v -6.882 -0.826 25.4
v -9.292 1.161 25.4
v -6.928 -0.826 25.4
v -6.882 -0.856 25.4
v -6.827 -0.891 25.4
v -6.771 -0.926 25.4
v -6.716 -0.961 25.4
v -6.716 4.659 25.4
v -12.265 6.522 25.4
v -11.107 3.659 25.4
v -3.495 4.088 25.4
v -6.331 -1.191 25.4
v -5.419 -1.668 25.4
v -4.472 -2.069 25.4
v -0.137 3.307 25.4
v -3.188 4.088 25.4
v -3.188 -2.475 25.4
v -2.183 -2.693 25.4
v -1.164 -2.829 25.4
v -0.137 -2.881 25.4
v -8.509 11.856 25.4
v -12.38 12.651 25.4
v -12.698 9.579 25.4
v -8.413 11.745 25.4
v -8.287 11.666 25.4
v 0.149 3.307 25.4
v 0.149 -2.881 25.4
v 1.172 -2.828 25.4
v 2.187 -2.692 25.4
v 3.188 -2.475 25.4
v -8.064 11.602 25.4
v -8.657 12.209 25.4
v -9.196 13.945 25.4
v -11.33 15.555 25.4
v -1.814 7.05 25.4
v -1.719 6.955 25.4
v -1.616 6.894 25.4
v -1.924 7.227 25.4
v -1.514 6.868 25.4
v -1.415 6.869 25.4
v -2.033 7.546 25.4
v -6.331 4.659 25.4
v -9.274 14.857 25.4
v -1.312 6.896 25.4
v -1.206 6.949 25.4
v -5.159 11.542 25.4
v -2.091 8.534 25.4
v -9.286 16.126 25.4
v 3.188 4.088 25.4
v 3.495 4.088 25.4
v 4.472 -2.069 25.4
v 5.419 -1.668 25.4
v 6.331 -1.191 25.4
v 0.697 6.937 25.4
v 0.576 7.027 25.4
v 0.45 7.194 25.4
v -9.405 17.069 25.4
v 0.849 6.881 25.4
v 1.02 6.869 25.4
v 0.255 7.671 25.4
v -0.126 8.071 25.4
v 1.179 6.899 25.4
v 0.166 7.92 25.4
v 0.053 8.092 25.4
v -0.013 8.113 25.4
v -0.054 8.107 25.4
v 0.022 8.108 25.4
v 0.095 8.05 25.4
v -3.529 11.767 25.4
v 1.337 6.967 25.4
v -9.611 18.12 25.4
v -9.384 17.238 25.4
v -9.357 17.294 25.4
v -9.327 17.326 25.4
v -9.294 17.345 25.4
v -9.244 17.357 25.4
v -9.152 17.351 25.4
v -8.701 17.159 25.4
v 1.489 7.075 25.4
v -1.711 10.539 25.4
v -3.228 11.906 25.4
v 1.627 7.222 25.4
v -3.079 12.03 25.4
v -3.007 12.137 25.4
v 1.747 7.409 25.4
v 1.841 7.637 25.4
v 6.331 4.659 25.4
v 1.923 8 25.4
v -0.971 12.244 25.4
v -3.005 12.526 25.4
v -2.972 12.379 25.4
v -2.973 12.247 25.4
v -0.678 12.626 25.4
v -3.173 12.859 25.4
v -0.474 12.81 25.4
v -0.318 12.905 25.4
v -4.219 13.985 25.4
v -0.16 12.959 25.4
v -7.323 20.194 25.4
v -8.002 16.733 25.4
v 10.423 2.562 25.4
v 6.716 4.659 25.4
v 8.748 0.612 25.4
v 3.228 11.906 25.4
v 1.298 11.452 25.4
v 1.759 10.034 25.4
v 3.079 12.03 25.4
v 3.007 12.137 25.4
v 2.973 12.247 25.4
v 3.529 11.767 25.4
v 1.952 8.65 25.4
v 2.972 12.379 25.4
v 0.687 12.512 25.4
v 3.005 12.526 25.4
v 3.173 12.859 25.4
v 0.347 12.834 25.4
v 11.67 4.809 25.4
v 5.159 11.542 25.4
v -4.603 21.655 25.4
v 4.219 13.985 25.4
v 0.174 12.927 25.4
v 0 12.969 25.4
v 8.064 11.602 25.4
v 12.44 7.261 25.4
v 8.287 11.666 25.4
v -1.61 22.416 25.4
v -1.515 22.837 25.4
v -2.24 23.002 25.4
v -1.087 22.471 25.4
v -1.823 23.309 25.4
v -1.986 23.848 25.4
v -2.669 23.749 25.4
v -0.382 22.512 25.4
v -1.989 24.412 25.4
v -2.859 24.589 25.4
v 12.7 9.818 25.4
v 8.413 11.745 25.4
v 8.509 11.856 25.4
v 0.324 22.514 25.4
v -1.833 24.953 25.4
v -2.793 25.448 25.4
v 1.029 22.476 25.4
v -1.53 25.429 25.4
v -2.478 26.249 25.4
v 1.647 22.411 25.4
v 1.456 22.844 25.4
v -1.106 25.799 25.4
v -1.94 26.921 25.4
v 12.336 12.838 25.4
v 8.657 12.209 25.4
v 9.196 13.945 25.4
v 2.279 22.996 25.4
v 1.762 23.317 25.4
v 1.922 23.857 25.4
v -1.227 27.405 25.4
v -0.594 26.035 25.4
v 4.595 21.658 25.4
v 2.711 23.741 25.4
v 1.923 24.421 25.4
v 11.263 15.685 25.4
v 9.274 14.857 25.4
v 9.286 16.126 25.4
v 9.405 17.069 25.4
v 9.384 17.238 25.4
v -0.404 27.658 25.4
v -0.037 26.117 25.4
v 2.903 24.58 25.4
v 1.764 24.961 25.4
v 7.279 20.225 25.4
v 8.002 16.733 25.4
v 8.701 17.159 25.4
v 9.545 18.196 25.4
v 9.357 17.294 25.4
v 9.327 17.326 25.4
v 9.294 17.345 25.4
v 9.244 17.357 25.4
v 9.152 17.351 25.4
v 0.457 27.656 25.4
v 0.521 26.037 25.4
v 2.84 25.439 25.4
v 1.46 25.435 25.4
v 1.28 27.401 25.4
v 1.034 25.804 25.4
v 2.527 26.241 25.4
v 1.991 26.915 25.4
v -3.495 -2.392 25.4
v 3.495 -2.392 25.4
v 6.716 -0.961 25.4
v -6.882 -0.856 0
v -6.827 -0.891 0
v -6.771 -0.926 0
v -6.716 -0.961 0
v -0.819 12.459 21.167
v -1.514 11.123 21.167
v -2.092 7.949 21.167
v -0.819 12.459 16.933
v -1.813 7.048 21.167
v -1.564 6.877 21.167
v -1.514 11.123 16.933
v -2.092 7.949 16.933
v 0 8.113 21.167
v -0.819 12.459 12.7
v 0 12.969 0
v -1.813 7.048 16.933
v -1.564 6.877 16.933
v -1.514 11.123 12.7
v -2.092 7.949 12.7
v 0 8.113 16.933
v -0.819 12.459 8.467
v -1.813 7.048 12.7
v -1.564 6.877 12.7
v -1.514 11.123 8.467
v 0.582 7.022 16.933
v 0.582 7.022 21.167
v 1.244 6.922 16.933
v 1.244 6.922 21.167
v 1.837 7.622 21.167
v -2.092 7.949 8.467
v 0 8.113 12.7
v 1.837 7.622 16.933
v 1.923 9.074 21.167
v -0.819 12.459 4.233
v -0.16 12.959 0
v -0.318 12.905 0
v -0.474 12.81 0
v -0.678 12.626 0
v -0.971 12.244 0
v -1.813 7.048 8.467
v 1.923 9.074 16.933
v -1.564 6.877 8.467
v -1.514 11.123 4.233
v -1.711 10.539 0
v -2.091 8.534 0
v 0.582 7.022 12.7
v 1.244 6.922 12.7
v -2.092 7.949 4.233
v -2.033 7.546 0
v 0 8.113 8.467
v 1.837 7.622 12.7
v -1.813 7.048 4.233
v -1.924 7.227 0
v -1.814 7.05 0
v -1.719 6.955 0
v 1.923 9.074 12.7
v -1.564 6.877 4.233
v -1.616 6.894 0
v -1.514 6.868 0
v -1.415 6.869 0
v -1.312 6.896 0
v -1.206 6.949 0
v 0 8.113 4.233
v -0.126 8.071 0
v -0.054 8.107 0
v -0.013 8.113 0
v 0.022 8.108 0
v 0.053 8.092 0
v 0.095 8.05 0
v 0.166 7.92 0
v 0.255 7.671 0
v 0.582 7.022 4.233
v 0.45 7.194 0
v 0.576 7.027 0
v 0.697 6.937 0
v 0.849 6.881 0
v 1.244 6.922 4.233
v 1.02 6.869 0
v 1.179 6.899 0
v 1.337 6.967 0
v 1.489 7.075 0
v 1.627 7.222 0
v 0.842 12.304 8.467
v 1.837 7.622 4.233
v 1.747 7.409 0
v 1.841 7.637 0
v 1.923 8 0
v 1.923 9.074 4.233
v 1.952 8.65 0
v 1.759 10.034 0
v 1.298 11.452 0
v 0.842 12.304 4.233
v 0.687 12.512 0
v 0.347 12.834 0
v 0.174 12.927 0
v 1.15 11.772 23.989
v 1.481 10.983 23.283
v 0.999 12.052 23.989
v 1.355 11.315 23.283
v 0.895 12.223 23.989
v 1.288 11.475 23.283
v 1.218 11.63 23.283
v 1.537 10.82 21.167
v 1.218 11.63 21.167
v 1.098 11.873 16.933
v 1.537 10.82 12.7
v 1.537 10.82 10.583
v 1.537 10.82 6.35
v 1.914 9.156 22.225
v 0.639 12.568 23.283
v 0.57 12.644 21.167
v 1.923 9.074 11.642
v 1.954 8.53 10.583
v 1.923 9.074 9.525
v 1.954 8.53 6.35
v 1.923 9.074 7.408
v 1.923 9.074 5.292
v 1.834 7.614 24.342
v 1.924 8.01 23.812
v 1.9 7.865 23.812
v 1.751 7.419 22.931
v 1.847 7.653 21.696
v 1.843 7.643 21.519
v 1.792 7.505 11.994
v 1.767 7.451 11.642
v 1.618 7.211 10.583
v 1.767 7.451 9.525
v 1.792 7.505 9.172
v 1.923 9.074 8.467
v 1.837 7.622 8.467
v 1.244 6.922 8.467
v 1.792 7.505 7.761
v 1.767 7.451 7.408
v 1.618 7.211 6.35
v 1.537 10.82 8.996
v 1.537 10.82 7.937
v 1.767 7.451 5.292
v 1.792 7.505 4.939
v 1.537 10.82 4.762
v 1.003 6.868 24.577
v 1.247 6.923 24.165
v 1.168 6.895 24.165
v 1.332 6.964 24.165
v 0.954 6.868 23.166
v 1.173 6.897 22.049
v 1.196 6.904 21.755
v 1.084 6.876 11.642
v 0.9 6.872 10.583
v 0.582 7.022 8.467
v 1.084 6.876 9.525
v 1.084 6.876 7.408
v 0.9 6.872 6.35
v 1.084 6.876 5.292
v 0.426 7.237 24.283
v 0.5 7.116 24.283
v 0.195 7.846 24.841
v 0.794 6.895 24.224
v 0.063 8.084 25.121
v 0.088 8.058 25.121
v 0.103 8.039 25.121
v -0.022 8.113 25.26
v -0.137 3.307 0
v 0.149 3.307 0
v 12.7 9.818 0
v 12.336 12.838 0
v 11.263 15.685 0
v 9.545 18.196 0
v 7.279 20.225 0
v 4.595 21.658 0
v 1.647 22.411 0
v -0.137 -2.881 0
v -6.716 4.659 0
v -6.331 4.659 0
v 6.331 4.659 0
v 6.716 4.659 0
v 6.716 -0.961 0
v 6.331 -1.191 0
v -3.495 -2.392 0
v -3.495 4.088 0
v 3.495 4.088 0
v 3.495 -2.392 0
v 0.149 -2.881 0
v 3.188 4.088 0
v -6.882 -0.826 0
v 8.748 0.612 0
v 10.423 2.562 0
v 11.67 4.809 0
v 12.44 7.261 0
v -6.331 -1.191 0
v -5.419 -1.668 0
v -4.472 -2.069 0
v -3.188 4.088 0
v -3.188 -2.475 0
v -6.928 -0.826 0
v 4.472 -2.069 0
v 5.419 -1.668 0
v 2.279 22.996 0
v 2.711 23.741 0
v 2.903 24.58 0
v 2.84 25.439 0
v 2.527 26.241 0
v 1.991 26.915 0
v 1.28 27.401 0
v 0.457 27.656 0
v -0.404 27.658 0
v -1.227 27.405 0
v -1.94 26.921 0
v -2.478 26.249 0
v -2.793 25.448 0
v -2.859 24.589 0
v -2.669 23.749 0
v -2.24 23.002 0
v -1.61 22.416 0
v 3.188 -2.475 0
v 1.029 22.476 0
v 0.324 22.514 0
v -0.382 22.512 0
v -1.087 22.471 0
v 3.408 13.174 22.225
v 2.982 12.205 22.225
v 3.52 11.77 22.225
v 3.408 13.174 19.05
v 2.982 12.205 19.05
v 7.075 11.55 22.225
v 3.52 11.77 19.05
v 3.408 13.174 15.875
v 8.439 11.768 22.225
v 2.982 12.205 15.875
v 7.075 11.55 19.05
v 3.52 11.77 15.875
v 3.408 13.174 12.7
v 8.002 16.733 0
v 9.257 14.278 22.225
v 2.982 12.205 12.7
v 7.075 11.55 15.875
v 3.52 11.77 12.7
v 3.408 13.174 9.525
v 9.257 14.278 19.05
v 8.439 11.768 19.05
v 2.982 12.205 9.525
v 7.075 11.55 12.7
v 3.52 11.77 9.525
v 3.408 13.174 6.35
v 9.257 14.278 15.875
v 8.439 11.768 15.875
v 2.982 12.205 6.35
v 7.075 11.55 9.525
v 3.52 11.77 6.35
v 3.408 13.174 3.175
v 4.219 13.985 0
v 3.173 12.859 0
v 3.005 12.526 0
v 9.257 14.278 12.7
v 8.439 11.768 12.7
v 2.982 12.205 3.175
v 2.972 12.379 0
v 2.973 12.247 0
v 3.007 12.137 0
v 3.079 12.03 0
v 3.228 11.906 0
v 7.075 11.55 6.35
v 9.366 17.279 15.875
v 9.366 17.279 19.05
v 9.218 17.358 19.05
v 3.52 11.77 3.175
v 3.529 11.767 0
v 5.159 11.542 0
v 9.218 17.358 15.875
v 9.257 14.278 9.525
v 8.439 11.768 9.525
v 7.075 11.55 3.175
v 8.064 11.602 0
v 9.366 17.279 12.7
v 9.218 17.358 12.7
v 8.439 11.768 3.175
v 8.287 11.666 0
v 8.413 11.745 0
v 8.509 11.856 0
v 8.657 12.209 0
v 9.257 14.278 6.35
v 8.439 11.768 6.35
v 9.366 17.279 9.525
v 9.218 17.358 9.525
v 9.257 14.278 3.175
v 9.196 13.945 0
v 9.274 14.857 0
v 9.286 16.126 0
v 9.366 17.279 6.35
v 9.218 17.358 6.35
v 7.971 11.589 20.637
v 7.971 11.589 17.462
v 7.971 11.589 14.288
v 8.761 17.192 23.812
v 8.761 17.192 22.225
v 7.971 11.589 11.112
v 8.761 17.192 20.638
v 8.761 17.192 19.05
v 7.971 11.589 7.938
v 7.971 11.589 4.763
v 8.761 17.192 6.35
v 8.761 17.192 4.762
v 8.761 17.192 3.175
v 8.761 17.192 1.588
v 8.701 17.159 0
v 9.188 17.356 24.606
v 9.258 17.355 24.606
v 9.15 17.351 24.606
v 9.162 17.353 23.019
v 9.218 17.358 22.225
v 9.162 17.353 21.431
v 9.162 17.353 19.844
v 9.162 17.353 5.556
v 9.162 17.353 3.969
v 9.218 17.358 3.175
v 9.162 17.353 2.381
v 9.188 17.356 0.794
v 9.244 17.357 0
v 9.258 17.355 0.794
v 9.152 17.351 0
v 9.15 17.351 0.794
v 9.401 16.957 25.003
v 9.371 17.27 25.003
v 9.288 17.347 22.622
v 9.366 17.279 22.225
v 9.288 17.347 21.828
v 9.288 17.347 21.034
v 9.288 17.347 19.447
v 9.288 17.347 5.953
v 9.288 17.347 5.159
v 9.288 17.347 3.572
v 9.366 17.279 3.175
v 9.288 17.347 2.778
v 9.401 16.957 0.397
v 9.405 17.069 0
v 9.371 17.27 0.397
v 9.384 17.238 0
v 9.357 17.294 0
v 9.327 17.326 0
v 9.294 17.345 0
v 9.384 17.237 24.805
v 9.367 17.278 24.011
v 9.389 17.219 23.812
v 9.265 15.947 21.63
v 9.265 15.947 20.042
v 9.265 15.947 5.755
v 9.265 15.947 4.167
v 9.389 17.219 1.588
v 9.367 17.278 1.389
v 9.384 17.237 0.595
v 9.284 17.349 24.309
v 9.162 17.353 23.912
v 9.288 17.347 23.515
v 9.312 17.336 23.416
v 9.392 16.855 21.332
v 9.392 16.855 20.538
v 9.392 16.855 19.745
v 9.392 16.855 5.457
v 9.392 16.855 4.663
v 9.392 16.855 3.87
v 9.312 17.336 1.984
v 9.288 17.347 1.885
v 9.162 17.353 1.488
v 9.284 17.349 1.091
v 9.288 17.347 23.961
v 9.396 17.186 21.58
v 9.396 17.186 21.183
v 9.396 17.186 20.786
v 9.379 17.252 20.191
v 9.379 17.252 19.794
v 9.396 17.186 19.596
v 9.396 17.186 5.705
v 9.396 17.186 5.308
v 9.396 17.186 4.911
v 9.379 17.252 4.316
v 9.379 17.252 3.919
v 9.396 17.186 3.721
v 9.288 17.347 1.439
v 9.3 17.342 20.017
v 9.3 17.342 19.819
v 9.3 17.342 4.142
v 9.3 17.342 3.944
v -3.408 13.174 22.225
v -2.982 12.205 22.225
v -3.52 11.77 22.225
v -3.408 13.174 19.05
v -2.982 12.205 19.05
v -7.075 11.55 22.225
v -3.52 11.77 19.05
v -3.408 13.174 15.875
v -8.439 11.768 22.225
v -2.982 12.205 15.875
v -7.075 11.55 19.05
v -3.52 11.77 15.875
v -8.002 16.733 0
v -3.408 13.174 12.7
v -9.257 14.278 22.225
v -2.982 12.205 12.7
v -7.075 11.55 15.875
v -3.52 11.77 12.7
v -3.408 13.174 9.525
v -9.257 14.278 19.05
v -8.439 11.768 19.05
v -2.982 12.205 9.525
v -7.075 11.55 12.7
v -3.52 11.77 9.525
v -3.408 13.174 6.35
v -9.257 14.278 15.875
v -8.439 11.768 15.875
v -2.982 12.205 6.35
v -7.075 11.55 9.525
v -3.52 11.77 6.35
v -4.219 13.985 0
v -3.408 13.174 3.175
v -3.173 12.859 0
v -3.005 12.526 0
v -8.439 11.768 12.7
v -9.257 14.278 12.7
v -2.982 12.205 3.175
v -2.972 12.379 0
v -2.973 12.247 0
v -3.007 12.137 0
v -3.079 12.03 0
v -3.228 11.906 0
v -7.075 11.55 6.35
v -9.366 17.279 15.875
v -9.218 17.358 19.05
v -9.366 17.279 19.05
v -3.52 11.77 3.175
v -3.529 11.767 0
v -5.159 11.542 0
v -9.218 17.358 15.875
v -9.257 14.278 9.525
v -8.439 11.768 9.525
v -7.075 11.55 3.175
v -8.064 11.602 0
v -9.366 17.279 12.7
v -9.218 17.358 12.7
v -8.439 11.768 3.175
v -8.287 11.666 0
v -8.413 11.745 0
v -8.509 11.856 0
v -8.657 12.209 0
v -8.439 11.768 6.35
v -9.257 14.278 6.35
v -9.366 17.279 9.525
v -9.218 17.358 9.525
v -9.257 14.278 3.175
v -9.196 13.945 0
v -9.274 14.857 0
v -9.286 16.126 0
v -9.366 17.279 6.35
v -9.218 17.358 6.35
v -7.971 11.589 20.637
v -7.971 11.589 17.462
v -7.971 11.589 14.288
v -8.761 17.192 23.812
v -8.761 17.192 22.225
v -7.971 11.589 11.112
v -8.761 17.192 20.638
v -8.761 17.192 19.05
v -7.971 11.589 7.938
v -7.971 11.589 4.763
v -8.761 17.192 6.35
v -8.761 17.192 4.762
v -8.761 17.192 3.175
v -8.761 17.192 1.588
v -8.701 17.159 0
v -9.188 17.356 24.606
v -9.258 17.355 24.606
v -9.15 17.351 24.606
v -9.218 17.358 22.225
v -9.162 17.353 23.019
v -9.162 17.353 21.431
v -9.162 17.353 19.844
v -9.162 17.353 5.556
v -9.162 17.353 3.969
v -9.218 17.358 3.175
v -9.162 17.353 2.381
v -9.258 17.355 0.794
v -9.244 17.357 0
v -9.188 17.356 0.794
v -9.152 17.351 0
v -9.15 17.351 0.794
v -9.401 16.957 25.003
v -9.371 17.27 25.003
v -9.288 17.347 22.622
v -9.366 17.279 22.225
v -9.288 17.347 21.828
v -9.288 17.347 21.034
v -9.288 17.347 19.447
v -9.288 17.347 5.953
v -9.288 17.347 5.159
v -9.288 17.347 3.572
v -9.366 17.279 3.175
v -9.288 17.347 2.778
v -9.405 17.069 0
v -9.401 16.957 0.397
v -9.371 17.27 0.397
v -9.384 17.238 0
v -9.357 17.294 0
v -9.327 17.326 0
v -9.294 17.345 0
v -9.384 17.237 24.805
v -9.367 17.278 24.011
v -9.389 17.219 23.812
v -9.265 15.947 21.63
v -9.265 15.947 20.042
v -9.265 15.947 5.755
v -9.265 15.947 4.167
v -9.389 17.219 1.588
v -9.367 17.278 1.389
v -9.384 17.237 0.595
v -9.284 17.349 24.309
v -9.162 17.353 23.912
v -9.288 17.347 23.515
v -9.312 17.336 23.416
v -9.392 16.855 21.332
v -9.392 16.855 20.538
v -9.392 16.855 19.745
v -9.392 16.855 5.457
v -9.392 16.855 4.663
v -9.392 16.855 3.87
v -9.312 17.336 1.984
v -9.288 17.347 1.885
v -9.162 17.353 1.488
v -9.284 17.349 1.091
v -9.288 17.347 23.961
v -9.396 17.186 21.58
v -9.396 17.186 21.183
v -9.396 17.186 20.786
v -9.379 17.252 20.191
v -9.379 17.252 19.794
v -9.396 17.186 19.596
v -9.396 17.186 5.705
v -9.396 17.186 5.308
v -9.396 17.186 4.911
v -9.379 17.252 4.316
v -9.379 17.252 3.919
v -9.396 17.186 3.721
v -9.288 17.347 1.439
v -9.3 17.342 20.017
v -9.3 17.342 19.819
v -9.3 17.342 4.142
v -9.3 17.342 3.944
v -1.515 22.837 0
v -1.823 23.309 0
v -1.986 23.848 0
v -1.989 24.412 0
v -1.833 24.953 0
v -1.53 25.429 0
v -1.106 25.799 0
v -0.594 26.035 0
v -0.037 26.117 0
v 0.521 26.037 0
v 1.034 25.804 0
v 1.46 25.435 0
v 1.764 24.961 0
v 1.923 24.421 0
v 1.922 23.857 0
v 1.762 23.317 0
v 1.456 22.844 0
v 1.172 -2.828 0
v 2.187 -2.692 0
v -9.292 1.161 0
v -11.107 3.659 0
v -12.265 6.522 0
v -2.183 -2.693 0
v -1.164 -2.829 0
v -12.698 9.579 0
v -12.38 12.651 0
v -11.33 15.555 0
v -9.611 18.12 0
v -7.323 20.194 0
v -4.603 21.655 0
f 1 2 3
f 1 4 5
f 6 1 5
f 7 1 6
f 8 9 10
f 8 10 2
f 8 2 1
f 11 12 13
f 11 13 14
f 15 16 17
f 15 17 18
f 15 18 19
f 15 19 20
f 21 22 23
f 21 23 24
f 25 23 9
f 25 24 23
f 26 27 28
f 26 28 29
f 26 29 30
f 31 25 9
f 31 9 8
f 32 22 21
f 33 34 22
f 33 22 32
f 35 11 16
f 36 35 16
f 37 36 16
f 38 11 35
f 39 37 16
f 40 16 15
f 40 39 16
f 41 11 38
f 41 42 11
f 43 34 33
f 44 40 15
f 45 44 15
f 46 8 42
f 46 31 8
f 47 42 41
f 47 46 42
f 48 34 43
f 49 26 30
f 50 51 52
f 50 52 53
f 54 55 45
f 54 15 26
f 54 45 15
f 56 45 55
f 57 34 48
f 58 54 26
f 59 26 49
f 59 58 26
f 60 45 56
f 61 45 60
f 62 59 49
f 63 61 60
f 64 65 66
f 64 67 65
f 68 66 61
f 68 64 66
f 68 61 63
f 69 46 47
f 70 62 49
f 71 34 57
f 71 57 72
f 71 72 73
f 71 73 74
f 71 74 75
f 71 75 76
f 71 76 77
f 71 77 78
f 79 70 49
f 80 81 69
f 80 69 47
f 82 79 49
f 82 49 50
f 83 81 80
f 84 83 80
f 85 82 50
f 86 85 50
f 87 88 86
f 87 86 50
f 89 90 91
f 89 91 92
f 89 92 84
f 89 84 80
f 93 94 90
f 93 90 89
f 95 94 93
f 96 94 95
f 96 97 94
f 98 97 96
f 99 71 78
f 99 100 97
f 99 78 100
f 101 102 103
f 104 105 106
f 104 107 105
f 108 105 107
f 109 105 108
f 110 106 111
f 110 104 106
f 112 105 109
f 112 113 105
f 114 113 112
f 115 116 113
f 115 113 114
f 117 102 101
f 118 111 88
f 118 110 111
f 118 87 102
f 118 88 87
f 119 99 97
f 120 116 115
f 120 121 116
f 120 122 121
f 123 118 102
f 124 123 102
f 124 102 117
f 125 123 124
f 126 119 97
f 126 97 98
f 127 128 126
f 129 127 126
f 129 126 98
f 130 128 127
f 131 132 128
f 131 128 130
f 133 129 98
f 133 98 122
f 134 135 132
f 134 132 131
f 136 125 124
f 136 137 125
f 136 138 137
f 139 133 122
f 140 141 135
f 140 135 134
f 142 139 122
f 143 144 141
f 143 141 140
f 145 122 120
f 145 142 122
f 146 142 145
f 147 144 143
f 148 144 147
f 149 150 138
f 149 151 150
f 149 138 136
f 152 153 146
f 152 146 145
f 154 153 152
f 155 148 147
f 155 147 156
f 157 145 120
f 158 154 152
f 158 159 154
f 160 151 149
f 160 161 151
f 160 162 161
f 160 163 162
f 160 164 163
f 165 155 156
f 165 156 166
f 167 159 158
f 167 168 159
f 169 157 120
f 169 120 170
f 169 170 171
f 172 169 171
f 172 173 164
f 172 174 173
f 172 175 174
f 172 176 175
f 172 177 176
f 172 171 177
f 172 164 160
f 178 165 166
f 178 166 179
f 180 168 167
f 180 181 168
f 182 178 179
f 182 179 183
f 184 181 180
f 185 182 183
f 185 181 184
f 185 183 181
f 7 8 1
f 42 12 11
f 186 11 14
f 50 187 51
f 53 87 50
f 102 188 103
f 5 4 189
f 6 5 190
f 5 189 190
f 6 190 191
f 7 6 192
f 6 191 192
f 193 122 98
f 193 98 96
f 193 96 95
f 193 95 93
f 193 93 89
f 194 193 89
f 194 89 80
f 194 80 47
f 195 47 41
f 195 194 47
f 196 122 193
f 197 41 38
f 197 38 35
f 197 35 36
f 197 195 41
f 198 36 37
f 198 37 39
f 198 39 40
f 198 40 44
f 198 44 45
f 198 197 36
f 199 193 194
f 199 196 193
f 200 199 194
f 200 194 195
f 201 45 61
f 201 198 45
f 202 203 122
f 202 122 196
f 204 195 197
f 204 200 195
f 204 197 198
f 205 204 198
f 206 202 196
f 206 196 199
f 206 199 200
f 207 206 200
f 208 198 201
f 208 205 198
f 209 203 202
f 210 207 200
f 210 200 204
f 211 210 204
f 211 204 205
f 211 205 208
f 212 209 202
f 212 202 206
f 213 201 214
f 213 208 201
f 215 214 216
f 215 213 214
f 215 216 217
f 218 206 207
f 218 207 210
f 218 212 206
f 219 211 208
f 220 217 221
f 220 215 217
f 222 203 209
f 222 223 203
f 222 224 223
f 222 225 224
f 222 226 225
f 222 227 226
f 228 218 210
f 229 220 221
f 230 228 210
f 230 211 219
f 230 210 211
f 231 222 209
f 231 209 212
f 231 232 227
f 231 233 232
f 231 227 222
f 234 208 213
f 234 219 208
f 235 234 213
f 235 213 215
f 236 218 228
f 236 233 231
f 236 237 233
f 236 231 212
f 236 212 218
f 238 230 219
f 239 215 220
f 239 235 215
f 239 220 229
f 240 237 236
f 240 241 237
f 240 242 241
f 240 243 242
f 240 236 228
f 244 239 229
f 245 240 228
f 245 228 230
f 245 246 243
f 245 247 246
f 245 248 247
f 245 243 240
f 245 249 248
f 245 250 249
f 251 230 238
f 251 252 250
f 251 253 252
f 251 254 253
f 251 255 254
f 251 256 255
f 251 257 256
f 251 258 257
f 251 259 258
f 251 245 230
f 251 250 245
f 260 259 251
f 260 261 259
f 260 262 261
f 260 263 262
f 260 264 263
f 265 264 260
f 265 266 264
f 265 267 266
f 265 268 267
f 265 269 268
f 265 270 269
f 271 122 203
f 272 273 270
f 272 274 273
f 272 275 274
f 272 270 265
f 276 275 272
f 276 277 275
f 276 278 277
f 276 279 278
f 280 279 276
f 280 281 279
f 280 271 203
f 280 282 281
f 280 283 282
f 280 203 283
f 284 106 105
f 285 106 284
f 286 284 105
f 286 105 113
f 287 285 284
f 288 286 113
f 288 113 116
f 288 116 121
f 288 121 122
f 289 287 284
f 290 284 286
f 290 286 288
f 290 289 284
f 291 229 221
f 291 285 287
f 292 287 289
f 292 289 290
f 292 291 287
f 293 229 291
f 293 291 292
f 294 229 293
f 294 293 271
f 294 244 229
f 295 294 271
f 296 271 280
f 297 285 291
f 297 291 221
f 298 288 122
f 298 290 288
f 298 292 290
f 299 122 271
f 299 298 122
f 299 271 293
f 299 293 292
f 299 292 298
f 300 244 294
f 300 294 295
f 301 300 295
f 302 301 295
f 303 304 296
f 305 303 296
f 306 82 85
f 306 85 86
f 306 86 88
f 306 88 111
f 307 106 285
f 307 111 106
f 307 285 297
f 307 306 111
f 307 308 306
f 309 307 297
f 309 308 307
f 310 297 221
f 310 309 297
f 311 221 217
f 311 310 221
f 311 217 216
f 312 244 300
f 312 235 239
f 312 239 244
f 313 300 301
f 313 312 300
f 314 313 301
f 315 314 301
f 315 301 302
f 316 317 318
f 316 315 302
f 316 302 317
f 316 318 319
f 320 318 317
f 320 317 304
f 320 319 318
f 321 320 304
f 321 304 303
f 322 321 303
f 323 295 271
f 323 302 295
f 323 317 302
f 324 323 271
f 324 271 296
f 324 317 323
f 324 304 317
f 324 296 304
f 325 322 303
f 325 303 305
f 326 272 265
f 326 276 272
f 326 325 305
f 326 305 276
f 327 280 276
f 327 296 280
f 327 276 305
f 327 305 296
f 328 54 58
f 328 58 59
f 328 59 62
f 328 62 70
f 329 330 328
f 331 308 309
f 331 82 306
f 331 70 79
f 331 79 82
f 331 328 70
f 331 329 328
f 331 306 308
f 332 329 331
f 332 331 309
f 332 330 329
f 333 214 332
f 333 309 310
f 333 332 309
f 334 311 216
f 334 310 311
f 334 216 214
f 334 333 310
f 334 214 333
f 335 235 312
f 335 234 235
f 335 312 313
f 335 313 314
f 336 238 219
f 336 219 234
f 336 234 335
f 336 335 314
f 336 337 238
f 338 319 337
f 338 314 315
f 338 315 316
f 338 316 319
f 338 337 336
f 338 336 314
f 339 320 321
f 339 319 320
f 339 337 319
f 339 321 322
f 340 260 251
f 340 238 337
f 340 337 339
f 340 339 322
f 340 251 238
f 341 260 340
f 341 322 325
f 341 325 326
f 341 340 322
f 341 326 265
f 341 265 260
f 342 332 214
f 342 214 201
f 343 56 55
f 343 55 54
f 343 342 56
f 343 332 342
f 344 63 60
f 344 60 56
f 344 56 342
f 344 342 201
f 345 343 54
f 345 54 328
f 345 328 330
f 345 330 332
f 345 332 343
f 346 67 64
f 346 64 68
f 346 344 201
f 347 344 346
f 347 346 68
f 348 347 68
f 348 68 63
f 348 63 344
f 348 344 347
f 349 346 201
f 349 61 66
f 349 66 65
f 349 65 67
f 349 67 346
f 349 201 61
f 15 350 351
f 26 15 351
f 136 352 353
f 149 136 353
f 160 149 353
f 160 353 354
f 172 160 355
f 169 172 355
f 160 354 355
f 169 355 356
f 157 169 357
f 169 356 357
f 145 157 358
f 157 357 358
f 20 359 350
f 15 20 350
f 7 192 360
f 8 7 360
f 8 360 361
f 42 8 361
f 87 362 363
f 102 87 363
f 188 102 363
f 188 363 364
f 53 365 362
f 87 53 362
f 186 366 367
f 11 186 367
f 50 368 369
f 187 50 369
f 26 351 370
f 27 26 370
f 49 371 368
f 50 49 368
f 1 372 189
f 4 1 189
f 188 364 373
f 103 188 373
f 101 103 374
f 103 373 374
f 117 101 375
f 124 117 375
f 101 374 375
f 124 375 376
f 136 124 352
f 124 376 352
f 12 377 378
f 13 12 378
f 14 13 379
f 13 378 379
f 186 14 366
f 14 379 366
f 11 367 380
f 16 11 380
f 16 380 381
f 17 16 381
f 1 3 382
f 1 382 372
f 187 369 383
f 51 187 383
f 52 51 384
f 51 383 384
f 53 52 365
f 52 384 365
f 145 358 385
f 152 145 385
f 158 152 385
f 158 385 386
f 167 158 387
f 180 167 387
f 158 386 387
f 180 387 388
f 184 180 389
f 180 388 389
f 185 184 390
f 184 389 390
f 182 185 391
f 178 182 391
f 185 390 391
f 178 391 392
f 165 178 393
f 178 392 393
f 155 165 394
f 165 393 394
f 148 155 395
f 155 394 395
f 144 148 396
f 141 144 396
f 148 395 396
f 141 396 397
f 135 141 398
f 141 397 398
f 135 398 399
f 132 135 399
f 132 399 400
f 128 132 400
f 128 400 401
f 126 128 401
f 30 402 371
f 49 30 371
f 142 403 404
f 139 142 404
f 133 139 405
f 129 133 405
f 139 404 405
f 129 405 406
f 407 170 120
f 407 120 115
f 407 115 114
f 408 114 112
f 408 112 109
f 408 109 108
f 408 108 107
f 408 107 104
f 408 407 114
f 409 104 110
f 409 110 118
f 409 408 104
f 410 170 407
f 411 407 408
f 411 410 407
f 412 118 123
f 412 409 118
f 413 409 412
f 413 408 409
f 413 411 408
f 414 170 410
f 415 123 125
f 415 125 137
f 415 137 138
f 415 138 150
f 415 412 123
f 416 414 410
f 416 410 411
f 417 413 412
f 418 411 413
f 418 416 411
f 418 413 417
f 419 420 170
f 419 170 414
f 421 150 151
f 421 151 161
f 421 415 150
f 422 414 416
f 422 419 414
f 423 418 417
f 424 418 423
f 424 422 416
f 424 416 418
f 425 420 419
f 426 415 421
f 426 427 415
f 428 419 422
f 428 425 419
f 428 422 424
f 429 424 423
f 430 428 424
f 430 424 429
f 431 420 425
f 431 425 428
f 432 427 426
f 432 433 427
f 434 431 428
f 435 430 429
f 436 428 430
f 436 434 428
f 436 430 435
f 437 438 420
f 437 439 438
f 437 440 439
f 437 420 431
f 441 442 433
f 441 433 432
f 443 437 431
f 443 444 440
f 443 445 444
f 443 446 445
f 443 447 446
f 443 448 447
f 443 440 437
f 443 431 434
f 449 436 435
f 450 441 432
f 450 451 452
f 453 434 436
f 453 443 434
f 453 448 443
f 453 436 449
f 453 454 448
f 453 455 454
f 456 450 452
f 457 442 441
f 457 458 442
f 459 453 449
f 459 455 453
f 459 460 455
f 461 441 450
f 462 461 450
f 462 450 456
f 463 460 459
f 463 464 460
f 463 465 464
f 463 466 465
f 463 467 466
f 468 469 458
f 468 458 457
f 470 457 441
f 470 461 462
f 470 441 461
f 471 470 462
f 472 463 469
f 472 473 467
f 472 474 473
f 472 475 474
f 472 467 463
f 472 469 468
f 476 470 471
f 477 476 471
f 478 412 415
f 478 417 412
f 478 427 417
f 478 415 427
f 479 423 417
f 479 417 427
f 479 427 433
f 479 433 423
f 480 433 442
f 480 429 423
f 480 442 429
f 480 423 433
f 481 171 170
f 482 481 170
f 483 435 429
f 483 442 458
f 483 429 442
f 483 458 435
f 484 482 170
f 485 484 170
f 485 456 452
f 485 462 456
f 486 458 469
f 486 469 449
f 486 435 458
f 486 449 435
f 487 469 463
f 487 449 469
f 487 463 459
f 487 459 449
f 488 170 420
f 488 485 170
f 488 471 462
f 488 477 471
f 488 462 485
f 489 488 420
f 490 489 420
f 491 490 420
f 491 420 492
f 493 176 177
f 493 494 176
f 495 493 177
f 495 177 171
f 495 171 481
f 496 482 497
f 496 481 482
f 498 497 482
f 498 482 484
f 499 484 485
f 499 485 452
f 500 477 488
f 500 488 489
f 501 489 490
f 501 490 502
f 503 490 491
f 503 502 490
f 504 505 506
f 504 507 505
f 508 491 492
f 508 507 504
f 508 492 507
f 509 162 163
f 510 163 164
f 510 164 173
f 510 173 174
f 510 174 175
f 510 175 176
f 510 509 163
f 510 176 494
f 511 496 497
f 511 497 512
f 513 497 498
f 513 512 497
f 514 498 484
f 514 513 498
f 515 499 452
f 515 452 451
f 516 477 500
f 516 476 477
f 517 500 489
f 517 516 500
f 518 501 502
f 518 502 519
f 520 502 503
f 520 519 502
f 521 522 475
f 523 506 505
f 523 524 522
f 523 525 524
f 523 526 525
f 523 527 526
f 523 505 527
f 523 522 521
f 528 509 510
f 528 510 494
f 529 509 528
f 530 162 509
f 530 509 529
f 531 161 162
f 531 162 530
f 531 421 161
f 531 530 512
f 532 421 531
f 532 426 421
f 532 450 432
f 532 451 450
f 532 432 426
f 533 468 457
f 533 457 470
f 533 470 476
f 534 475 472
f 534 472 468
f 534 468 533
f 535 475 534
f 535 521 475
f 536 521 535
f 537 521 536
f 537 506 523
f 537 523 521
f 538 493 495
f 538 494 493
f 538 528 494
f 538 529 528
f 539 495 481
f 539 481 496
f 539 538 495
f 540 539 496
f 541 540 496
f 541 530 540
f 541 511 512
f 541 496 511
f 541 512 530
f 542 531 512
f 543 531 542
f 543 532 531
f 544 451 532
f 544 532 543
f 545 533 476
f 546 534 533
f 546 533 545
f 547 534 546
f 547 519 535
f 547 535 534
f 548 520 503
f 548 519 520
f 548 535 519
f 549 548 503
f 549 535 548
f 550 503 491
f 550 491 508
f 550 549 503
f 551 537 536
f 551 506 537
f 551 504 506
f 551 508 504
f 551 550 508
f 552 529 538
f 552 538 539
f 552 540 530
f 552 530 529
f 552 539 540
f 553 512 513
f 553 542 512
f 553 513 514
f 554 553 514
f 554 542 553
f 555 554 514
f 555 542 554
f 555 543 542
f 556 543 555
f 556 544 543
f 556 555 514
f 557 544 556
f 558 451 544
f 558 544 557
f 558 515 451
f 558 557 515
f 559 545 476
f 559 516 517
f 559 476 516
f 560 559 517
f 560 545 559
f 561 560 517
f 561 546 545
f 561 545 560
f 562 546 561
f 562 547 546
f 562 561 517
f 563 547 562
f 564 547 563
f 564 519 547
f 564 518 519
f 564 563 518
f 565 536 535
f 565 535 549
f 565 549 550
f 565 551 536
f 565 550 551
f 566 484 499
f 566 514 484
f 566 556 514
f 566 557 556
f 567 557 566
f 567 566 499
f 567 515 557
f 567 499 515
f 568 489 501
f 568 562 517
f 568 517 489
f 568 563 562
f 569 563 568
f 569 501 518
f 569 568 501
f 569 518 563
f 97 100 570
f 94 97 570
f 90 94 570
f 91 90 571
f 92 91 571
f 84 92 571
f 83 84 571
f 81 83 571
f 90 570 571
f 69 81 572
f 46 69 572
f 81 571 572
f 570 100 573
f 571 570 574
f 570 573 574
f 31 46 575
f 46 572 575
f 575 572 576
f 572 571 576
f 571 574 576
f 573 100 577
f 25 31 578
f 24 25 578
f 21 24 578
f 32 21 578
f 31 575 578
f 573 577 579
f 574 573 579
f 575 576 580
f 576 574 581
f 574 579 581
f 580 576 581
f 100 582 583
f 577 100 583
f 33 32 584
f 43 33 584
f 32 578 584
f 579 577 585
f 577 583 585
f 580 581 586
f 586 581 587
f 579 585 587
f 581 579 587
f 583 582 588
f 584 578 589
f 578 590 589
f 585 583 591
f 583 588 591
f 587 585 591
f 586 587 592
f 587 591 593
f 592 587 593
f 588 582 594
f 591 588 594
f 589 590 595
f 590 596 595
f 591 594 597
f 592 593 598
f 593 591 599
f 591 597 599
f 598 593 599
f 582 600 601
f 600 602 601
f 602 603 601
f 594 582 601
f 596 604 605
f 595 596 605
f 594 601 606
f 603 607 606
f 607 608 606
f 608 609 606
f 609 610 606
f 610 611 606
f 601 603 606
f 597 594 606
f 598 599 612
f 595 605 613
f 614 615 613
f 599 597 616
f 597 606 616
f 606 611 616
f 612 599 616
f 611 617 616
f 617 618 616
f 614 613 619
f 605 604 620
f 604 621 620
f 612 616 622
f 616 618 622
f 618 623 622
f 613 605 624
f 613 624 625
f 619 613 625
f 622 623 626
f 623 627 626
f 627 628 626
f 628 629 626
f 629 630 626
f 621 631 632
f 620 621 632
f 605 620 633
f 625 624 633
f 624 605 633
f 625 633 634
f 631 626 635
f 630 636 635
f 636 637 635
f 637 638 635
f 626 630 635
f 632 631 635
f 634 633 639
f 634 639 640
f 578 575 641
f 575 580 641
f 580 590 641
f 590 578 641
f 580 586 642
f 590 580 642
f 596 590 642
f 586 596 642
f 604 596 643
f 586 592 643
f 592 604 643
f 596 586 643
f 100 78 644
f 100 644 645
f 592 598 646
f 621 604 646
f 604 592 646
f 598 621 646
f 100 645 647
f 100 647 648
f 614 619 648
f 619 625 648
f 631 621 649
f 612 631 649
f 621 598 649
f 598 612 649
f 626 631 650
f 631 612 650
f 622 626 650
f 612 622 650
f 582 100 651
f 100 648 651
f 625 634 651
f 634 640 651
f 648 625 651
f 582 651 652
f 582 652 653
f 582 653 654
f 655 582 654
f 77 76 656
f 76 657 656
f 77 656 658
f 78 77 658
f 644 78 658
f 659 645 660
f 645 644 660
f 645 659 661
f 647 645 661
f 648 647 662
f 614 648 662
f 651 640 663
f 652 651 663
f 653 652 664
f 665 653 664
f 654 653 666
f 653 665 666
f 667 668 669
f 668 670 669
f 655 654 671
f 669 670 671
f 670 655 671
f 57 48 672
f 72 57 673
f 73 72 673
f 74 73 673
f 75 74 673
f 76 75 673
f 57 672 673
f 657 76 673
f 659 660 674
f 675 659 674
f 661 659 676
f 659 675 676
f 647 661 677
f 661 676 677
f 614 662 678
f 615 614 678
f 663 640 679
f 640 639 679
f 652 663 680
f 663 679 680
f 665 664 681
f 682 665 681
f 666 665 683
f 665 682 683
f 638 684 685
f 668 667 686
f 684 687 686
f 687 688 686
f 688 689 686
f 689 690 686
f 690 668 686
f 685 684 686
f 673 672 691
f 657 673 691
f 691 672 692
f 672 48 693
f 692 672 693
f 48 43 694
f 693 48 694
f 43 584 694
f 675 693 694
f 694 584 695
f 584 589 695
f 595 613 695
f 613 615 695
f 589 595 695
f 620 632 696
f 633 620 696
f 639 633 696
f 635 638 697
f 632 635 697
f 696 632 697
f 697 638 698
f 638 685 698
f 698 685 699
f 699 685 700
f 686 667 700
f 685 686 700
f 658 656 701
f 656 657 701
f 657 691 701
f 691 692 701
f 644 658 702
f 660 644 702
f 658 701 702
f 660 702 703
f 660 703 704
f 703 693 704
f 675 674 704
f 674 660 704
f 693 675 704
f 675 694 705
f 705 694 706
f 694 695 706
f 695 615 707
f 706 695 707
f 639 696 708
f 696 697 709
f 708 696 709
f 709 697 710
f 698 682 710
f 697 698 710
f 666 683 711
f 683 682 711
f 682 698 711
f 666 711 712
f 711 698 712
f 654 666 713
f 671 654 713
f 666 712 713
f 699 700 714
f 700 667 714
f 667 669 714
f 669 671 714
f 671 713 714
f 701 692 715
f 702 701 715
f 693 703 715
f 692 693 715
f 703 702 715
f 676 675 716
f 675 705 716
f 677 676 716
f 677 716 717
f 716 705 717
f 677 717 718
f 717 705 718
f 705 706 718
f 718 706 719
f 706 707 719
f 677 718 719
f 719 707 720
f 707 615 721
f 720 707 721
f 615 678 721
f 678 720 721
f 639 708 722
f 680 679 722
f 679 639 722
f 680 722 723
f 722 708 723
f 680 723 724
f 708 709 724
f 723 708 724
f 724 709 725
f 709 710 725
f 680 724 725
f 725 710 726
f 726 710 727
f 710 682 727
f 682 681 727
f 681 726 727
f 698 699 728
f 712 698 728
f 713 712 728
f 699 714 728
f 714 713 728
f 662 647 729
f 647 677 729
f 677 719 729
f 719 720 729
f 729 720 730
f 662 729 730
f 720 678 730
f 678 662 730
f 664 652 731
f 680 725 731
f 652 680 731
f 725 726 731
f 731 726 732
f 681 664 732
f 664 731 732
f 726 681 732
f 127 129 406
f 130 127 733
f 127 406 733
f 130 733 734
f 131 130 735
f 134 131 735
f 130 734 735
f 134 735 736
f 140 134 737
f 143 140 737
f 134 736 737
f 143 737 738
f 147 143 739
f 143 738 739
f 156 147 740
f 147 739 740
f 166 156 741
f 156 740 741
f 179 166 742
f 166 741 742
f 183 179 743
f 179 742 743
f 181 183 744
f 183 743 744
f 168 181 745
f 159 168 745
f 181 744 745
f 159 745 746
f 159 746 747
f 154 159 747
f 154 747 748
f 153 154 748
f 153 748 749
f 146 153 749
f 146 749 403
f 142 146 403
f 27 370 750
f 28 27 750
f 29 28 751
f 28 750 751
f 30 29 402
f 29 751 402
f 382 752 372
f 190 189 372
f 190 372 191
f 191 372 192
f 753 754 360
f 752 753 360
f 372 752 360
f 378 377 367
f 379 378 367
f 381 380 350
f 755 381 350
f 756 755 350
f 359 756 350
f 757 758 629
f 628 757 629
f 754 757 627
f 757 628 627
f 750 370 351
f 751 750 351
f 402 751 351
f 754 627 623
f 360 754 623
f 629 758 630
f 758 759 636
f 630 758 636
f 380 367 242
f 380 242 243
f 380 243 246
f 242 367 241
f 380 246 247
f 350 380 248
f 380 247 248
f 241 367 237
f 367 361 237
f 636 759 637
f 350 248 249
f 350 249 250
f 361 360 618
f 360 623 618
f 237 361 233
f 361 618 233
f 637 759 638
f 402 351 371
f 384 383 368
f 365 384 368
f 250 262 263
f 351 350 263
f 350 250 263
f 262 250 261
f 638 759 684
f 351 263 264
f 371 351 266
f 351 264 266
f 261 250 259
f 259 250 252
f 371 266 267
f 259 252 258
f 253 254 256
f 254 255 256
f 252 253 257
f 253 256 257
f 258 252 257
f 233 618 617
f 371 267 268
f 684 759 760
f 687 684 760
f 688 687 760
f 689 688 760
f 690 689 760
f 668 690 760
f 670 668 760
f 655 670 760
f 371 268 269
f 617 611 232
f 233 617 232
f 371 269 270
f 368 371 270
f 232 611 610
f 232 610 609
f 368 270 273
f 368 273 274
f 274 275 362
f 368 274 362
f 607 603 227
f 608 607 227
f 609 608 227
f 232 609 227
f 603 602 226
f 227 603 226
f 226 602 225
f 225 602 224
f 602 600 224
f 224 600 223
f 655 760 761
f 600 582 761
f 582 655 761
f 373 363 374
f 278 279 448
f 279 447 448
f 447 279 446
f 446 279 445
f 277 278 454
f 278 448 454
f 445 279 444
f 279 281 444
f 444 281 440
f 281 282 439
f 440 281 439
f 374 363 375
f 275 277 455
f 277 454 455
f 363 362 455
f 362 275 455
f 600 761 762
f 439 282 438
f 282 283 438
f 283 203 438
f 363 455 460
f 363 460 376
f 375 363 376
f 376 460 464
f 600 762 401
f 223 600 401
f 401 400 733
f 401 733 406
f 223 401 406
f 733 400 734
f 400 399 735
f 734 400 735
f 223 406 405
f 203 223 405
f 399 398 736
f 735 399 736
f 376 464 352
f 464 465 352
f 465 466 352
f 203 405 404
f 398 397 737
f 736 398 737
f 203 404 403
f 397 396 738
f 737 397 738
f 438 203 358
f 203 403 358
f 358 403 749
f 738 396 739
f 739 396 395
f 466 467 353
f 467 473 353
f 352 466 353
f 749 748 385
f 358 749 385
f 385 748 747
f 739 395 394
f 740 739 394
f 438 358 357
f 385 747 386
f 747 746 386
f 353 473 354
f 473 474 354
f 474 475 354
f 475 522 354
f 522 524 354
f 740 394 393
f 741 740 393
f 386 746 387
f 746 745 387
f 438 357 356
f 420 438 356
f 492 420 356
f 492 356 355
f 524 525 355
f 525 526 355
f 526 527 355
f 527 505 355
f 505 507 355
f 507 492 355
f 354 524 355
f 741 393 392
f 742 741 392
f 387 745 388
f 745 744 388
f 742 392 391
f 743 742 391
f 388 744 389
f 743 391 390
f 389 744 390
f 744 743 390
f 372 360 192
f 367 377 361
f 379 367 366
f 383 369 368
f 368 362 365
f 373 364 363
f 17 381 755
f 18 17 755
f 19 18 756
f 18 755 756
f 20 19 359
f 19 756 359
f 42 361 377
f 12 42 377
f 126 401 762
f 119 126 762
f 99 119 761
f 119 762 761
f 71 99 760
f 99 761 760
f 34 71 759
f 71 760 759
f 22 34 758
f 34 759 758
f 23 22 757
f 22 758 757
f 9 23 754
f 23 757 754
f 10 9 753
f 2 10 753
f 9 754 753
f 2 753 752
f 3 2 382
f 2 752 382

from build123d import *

# Parameters (mm, degrees)
F1_DEPTH = 25.4


with BuildPart() as f1:
    # F0 (on Top) → F1 (new body)
    with BuildSketch(Plane.XY):
        with BuildLine():
            ThreePointArc((6.7156300194, -0.961144645), (11.103569274, 3.653541643), (12.7, 9.8180164282))
            ThreePointArc((12.7, 9.8180164282), (9.5449480524, 18.1956035913), (1.6474068226, 22.4107147395))
            ThreePointArc((1.6474068226, 22.4107147395), (1.3388234894, 22.4472504376), (1.0294386506, 22.4762254667))
            ThreePointArc((1.0294386506, 22.4762254667), (-0.028773145, 22.5179838339), (-1.086784862, 22.4714309343))
            ThreePointArc((-1.086784862, 22.4714309343), (-1.3485915697, 22.4462111043), (-1.6098198538, 22.4155749233))
            ThreePointArc((-1.6098198538, 22.4155749233), (-12.3800103209, 12.6509203191), (-6.9281209855, -0.8258146307))
            Line((-6.9281209855, -0.8258146307), (-6.8822319383, -0.8258146307))
            Line((-6.8822319383, -0.8258146307), (-6.8822319383, -0.855543594))
            ThreePointArc((-6.8822319383, -0.855543594), (-6.7991360003, -0.9086675725), (-6.7156300194, -0.961144645))
            Line((-6.7156300194, -0.961144645), (-6.7156300194, 4.6587398687))
            Line((-6.7156300194, 4.6587398687), (-6.3310727347, 4.6587398687))
            Line((-6.3310727347, 4.6587398687), (-6.3310727347, -1.1914121687))
            ThreePointArc((-6.3310727347, -1.1914121687), (-4.9495356332, -1.8777989353), (-3.4949700482, -2.3916184706))
            Line((-3.4949700482, -2.3916184706), (-3.4949700482, 4.0883066069))
            Line((-3.4949700482, 4.0883066069), (-3.1876309074, 4.0883066069))
            Line((-3.1876309074, 4.0883066069), (-3.1876309074, -2.4754374884))
            ThreePointArc((-3.1876309074, -2.4754374884), (-1.6746684307, -2.7710854321), (-0.13703122, -2.8812442765))
            Line((-0.13703122, -2.8812442765), (-0.13703122, 3.3066231491))
            Line((-0.13703122, 3.3066231491), (0.1494322853, 3.3066231491))
            Line((0.1494322853, 3.3066231491), (0.1494322853, -2.8811044072))
            ThreePointArc((0.1494322853, -2.8811044072), (1.6808150107, -2.7702662546), (3.1876309074, -2.4754374884))
            Line((3.1876309074, -2.4754374884), (3.1876309074, 4.0883066069))
            Line((3.1876309074, 4.0883066069), (3.4949700482, 4.0883066069))
            Line((3.4949700482, 4.0883066069), (3.4949700482, -2.3916184706))
            ThreePointArc((3.4949700482, -2.3916184706), (4.9495356332, -1.8777989353), (6.3310727347, -1.1914121687))
            Line((6.3310727347, -1.1914121687), (6.3310727347, 4.6587398687))
            Line((6.3310727347, 4.6587398687), (6.7156300194, 4.6587398687))
            Line((6.7156300194, 4.6587398687), (6.7156300194, -0.961144645))
        make_face()
        with BuildLine():
            add(Edge.make_bspline(
                [(0, 12.9685981976), (-1.1262707569, 13.0608157796), (-2.748365158, 7.936569366), (-1.2735758817, 6.2577367621), (0.1843082925, 8.9908750032), (0.2962277728, 6.5228781858), (2.9280933099, 7.2517179831), (1.1483668305, 12.8745714179), (0, 12.9685981976)],
                knots=[0, 0, 0, 0, 0.2461617493, 0.3674777738, 0.5071240723, 0.6245056694, 0.7490088542, 1, 1, 1, 1], degree=3))
        make_face(mode=Mode.SUBTRACT)
        with BuildLine():
            add(Edge.make_bspline(
                [(-8.0023061995, 16.7331782252), (-6.2510557676, 15.6142079944), (0.0505703268, 11.3072332803), (-7.1931373209, 11.5741872719), (-8.536675253, 11.5601551472), (-8.7321601562, 12.6489403605), (-9.4405060529, 14.3126079871), (-9.1067828933, 15.7231243812), (-9.6696121761, 17.7306750622), (-8.8186828026, 17.2548061427), (-8.0023061995, 16.7331782252)],
                knots=[0, 0, 0, 0, 0.2214766404, 0.3948821826, 0.4949979166, 0.5749687847, 0.6880101274, 0.7951541475, 0.8967547165, 1, 1, 1, 1], degree=3))
        make_face(mode=Mode.SUBTRACT)
        with BuildLine():
            add(Edge.make_bspline(
                [(8.0023061995, 16.7331782252), (6.2510557676, 15.6142079944), (-0.0505703268, 11.3072332803), (7.1931373209, 11.5741872719), (8.536675253, 11.5601551472), (8.7321601562, 12.6489403605), (9.4405060529, 14.3126079871), (9.1067828933, 15.7231243812), (9.6696121761, 17.7306750622), (8.8186828026, 17.2548061427), (8.0023061995, 16.7331782252)],
                knots=[0, 0, 0, 0, 0.2214766404, 0.3948821826, 0.4949979166, 0.5749687847, 0.6880101274, 0.7951541475, 0.8967547165, 1, 1, 1, 1], degree=3))
        make_face(mode=Mode.SUBTRACT)
        with BuildLine():
            ThreePointArc((1.0294386506, 22.4762254667), (1.3388234894, 22.4472504376), (1.6474068226, 22.4107147395))
            ThreePointArc((1.6474068226, 22.4107147395), (0.0266660272, 27.6892120738), (-1.6098198538, 22.4155749233))
            ThreePointArc((-1.6098198538, 22.4155749233), (-1.3485915697, 22.4462111043), (-1.086784862, 22.4714309343))
            ThreePointArc((-1.086784862, 22.4714309343), (-0.0369259735, 26.1165009701), (1.0294386506, 22.4762254667))
        make_face()
    extrude(amount=F1_DEPTH)


solid = f1.part
